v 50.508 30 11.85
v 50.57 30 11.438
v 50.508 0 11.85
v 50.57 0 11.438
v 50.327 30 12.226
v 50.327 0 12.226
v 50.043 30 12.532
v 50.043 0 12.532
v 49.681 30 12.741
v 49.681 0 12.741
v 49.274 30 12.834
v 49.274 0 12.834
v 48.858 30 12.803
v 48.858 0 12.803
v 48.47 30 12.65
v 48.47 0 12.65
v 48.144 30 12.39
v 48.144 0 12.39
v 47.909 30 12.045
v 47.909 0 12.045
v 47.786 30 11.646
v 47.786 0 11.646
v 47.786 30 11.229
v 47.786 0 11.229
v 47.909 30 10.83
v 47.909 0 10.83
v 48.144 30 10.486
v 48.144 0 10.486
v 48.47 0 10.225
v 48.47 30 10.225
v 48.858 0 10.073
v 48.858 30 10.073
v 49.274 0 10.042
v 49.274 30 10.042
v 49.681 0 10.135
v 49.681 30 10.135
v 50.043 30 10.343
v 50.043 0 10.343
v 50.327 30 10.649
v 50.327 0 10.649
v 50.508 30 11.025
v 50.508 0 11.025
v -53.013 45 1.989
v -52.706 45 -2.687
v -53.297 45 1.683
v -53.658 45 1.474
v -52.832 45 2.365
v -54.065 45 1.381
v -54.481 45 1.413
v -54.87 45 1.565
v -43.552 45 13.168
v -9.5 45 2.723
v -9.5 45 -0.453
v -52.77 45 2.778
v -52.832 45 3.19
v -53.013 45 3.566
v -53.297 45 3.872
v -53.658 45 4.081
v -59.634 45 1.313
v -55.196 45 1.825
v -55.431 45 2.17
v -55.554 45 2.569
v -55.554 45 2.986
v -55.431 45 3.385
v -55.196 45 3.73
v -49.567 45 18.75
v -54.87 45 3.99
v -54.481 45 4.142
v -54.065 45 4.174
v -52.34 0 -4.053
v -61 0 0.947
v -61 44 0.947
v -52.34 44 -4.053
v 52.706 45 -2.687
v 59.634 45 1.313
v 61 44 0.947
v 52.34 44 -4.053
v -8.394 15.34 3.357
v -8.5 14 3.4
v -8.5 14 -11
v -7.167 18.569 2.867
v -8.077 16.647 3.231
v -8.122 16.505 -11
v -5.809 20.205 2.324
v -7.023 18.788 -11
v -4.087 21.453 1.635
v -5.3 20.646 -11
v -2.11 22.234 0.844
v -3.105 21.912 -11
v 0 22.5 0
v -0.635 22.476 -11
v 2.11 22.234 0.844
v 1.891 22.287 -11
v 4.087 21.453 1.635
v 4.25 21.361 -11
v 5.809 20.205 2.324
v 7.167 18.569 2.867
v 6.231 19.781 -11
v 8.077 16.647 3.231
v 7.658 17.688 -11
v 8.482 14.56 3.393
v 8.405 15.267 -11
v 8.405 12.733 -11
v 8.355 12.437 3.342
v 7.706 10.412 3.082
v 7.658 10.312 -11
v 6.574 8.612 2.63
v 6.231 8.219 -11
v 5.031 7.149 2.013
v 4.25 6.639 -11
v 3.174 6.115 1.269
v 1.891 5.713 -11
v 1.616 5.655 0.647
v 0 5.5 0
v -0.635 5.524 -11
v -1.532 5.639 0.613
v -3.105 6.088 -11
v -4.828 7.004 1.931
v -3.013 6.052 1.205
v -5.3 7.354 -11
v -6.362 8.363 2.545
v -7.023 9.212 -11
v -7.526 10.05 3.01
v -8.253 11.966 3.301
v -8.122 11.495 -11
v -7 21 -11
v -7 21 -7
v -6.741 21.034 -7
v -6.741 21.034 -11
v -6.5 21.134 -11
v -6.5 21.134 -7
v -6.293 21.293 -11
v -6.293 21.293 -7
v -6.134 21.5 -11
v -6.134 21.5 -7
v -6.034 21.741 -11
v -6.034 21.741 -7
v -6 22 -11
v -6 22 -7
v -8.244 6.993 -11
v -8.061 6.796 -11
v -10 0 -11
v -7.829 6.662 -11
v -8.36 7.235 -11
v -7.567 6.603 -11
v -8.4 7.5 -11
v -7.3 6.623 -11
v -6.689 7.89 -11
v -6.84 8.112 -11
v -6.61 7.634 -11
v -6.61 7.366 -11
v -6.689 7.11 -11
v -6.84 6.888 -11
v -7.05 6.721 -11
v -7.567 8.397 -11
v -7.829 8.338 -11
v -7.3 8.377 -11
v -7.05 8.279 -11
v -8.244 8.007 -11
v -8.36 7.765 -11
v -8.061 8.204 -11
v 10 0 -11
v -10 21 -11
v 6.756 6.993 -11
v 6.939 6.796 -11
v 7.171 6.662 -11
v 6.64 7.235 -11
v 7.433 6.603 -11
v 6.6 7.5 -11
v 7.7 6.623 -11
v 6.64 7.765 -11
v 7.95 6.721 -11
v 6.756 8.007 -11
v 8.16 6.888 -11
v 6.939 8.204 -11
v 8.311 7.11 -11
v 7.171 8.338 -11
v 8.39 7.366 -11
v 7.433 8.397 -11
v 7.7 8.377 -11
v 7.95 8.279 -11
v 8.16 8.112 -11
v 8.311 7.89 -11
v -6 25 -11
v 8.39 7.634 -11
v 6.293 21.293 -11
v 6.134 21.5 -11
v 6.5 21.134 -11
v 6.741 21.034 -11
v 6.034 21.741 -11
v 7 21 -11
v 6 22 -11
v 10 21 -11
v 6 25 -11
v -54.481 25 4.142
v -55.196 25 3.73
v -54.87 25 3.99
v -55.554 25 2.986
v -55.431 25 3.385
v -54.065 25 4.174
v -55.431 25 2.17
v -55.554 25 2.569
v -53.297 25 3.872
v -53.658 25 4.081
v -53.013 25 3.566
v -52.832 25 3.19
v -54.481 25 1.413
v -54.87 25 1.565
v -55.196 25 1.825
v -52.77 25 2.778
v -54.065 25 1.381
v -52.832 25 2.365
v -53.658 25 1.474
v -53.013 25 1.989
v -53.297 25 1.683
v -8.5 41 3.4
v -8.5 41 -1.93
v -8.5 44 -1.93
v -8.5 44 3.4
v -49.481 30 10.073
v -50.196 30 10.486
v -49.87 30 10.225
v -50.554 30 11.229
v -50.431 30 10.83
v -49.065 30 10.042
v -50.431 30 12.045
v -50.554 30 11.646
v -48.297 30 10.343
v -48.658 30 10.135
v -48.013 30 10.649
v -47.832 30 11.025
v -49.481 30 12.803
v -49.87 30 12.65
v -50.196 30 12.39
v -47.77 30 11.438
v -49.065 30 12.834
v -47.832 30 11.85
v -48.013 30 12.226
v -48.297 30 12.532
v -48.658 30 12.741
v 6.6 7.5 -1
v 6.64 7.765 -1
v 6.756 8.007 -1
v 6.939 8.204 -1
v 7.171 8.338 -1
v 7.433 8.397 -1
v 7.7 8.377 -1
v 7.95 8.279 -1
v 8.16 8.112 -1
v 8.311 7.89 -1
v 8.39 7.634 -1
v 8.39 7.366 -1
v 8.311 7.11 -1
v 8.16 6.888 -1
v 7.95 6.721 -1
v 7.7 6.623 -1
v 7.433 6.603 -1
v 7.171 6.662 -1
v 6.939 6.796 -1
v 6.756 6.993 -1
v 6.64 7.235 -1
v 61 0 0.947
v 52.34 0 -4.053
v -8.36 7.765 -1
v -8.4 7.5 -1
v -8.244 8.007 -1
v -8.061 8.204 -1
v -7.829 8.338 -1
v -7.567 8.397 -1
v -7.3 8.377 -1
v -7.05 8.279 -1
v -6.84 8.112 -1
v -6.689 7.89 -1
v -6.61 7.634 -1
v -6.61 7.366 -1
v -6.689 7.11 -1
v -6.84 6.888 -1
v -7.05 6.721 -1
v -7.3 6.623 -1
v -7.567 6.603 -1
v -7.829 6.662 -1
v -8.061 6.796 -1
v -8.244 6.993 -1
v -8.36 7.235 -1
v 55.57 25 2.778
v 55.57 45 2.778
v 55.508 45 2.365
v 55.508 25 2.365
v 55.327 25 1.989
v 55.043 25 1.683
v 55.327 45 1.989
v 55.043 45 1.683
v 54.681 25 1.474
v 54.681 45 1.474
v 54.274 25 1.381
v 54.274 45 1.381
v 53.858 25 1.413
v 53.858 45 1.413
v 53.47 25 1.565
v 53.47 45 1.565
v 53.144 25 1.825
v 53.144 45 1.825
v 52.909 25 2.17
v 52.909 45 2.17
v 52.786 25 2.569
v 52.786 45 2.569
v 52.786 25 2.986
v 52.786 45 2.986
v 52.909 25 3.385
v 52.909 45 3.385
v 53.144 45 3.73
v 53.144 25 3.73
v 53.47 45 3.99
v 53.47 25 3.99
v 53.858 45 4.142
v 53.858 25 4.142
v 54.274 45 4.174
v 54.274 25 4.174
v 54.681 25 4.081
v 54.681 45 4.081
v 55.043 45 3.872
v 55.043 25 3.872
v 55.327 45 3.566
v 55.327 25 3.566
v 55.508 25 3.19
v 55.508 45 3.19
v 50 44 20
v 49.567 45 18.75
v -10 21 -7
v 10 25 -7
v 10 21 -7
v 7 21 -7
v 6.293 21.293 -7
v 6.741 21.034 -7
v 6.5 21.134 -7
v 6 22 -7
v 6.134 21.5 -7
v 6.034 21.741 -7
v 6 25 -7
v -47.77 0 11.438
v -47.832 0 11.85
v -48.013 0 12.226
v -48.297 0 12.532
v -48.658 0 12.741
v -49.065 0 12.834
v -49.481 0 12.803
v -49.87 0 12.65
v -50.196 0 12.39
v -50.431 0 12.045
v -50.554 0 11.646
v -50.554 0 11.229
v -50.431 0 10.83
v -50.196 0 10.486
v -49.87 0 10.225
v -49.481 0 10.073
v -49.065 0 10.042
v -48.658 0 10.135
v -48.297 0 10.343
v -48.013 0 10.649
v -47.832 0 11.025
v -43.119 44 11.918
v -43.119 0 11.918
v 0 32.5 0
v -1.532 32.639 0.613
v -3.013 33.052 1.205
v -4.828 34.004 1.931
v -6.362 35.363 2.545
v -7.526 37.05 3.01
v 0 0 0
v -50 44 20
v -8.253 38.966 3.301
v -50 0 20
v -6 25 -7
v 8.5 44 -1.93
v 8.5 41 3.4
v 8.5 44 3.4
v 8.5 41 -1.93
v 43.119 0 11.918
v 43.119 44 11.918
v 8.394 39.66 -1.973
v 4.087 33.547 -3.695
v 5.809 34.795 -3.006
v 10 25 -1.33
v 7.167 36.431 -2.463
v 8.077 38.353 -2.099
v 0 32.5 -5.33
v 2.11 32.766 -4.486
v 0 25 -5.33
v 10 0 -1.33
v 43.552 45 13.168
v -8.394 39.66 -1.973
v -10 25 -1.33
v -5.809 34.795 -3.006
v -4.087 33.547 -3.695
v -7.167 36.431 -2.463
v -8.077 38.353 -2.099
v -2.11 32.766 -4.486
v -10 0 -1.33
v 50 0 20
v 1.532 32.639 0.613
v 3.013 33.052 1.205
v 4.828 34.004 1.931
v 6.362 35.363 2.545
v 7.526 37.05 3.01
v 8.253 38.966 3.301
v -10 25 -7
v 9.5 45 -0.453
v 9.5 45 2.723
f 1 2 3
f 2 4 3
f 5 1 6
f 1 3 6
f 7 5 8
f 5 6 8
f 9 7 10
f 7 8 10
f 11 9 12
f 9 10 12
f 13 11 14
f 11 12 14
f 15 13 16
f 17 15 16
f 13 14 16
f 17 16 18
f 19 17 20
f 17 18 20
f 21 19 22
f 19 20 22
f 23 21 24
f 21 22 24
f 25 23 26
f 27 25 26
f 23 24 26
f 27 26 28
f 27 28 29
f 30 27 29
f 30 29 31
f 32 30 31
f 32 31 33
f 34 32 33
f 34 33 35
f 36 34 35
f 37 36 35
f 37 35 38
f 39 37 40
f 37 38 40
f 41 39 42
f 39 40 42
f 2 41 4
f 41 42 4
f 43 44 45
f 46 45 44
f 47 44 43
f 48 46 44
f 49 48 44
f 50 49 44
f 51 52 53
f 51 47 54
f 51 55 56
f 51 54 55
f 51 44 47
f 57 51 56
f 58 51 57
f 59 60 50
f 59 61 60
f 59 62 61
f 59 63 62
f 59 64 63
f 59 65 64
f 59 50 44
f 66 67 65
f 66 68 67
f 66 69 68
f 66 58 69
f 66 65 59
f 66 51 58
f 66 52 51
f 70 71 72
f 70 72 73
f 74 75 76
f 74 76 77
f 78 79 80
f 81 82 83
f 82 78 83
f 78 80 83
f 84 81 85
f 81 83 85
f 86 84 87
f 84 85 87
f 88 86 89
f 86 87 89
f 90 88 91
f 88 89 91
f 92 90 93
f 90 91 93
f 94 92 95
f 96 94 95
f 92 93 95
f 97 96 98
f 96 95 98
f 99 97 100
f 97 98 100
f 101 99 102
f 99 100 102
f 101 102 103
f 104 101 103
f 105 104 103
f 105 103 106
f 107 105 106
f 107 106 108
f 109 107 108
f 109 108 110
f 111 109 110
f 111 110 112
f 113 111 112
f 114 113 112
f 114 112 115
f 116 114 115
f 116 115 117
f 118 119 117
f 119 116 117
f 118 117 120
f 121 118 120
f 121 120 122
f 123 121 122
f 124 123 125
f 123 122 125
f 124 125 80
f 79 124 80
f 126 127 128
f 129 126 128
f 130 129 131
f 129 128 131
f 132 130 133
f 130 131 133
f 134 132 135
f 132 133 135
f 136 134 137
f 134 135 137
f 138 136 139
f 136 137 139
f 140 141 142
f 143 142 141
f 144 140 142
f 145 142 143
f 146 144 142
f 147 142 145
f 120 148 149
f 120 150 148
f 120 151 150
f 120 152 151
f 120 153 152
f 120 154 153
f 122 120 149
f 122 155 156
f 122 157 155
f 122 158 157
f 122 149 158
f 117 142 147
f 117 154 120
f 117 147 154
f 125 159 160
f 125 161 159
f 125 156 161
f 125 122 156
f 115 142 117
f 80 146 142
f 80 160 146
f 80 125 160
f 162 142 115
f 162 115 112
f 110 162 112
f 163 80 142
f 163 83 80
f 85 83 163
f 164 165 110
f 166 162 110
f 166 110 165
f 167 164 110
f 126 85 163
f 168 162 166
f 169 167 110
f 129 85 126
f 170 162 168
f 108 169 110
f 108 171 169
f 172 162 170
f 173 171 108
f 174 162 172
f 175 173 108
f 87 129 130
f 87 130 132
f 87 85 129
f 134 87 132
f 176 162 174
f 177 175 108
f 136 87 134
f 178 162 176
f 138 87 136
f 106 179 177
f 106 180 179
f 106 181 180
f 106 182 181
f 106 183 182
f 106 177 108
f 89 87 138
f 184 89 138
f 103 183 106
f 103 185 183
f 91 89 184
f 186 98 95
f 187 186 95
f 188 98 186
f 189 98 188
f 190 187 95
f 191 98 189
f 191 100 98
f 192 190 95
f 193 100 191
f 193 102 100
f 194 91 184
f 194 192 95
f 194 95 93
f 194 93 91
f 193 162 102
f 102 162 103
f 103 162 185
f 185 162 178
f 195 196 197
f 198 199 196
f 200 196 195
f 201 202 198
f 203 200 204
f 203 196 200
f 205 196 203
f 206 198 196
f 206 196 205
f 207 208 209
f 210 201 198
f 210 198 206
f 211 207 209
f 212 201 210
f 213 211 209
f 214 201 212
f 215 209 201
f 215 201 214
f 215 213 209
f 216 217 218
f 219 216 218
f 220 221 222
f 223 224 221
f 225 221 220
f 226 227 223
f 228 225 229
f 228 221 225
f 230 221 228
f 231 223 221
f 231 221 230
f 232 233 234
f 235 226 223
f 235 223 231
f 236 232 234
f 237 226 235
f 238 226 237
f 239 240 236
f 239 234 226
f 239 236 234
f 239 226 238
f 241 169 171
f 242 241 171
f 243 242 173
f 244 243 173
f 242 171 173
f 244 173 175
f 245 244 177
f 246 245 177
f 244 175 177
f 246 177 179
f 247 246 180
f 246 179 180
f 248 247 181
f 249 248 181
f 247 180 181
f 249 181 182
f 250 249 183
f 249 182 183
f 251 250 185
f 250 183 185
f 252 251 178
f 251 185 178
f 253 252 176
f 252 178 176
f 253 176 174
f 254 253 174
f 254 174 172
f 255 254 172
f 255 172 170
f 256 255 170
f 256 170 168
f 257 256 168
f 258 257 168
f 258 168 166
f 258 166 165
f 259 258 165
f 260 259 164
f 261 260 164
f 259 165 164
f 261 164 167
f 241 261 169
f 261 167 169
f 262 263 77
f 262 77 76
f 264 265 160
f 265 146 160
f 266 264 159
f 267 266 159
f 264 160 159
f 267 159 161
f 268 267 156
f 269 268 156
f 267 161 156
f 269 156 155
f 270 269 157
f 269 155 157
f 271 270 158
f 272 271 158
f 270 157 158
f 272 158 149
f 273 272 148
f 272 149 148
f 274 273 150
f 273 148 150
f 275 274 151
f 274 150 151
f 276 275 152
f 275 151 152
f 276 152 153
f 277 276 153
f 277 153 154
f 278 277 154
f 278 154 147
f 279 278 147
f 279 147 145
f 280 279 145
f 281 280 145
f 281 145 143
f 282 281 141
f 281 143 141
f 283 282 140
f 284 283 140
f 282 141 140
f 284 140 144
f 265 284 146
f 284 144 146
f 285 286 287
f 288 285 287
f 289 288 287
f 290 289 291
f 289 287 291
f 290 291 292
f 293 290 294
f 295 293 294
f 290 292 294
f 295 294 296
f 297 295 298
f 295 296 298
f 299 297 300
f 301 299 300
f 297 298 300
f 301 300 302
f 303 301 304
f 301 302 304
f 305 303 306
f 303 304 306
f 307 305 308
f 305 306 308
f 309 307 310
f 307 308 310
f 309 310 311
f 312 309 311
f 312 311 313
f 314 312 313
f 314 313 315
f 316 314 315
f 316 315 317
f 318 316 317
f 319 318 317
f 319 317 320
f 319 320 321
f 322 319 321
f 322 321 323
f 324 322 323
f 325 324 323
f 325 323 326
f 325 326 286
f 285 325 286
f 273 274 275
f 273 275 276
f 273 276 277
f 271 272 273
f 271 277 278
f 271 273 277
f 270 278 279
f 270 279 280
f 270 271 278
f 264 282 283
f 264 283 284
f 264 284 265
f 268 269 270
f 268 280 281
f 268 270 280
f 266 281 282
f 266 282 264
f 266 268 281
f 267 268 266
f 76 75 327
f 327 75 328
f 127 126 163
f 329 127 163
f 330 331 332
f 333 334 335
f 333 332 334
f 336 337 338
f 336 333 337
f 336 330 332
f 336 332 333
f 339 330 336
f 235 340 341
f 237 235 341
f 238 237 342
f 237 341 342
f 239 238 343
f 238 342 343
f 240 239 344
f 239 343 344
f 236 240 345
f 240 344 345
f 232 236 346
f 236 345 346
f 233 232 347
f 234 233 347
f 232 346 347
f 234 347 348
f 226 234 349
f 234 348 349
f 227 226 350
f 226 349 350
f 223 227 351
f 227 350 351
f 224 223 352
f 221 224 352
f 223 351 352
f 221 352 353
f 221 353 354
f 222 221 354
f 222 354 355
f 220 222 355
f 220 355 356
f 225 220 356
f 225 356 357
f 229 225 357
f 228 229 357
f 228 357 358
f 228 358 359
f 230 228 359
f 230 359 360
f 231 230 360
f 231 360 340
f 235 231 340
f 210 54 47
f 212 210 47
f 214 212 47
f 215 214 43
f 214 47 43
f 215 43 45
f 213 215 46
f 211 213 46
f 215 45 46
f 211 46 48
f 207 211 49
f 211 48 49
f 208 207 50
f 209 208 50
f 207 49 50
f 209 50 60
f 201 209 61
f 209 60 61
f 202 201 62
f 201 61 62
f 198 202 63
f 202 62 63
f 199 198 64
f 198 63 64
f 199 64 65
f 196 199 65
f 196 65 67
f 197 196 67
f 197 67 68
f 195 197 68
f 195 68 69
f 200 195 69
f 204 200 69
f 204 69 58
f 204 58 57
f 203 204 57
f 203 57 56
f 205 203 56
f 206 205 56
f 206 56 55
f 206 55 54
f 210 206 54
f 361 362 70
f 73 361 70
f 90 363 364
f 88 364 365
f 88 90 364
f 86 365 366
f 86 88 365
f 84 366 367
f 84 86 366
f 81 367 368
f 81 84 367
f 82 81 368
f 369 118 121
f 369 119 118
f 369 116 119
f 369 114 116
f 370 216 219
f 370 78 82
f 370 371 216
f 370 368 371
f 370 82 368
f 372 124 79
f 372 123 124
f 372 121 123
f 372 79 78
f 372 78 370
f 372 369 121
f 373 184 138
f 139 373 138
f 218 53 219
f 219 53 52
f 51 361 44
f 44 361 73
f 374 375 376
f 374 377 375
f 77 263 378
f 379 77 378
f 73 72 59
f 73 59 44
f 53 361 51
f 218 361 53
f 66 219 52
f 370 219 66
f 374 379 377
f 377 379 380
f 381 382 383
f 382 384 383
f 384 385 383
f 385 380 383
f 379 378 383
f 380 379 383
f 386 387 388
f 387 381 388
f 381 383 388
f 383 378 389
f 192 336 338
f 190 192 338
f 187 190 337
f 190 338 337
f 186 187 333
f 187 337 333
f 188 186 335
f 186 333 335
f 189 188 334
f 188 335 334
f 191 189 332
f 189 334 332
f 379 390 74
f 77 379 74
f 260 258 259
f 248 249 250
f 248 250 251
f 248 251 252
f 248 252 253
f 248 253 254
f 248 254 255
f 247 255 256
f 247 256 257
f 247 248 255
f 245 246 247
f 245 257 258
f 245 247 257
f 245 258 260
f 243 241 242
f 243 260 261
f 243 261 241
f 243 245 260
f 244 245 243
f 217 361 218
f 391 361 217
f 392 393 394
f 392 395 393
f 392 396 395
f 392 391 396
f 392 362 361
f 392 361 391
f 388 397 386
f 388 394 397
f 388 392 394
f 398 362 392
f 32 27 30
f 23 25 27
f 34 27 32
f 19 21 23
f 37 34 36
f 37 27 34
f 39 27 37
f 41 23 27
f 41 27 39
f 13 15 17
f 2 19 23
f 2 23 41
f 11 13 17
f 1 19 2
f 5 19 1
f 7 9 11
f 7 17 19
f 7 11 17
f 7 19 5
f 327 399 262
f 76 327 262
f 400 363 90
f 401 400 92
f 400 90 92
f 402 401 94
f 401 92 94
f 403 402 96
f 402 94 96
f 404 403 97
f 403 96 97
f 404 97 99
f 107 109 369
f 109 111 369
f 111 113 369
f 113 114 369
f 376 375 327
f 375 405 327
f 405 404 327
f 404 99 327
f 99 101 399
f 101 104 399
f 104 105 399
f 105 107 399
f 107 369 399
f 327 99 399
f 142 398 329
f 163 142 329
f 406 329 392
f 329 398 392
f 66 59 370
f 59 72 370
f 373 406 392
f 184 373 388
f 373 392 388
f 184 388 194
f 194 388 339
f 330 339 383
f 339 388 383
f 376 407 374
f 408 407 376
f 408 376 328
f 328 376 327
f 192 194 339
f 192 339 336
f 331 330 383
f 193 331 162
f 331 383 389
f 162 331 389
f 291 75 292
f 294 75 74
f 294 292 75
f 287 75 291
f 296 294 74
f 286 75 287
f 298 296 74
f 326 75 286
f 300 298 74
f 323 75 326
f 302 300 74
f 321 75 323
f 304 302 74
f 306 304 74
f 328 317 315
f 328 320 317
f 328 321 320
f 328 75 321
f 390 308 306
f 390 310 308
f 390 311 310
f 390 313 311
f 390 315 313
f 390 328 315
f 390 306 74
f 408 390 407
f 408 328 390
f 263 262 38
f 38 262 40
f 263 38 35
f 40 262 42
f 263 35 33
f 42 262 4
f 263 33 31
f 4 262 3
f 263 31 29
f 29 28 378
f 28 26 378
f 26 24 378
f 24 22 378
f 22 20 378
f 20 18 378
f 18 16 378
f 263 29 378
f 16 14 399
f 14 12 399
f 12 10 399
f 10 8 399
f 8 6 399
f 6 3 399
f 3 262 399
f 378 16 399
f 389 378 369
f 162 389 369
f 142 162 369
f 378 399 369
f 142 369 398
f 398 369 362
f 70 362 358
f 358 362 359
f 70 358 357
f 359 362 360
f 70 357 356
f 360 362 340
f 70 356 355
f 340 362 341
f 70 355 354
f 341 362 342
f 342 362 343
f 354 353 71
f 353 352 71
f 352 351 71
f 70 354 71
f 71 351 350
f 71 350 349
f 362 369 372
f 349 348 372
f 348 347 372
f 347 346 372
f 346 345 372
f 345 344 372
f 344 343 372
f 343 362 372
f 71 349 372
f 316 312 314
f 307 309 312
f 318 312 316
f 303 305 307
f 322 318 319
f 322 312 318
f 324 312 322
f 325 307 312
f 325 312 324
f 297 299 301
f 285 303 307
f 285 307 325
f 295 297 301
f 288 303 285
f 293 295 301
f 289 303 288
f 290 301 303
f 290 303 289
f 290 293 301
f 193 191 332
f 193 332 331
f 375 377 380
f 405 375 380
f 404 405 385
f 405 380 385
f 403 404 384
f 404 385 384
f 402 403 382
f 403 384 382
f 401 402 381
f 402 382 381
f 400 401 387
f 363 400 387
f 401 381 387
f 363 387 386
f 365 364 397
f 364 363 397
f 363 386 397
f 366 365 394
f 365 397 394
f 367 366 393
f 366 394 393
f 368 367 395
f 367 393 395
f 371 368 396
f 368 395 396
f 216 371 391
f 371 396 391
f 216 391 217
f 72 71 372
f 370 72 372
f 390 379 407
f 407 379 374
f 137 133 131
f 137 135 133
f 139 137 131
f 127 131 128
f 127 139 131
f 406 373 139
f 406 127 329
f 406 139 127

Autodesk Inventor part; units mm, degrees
ref_plane "XZ Plane" through (0, 0, 0) normal (0, 1, 0) x (-1, 0, 0)
ref_plane "XY Plane" through (0, 0, 0) normal (0, 0, 1) x (1, 0, 0)
sketch "Sketch1" plane through (0, 0, 0) normal (0, 1, 0) x (-1, 0, 0)
  line L0 (-56.669873, -1.552559) -> (-61, 0.947441)
  line L1 (56.669873, -1.552559) -> (61, 0.947441)
  line L2 (61, 0.947441) -> (50, 20)
  line L3 (-50, 20) -> (-61, 0.947441)
  line L4 (0, 0) -> (-50, 20)
  line L5 (0, 0) -> (50, 20)
  line L6 (-50, 20) -> (-55, 11.339746)
  line L7 (50, 20) -> (55, 11.339746)
  line L8 (-56.669873, -1.552559) -> (-52.339746, -4.052559)
  line L9 (56.669873, -1.552559) -> (52.339746, -4.052559)
  line L10 (50, 20) -> (52.5, 15.669873)
  line L11 (-50, 20) -> (-52.5, 15.669873)
  line L12 (-43.119361, 11.917617) -> (0, -5.330127)
  line L13 (43.119361, 11.917617) -> (0, -5.330127)
  line L14 (-52.339746, -4.052559) -> (-43.119361, 11.917617)
  line L15 (43.119361, 11.917617) -> (52.339746, -4.052559)
  dimension "d1" = 5
  dimension "d2" = 5
  dimension "d3" = 5
  dimension "d4" = 5
extrude "Extrusion1" add sketch "Sketch1" along normal blind 45
sketch "Sketch2" plane through (0, 0, 0) normal (0, -1, 0) x (1, 0, 0)
  line L0 (61, 0.947441) -> (52.339746, -4.052559)
  line L1 (50, 20) -> (61, 0.947441)
  line L2 (0, 0) -> (50, 20)
  line L3 (-50, 20) -> (0, 0)
  line L4 (-61, 0.947441) -> (-50, 20)
  line L5 (-52.339746, -4.052559) -> (-61, 0.947441)
  line L6 (-43.119361, 11.917617) -> (-52.339746, -4.052559)
  line L7 (0, -5.330127) -> (-43.119361, 11.917617)
  line L8 (43.119361, 11.917617) -> (0, -5.330127)
  line L9 (52.339746, -4.052559) -> (43.119361, 11.917617)
  line L10 (-56.669873, -1.552559) -> (-49.169873, 11.437822)
  line L11 (56.669873, -1.552559) -> (49.169873, 11.437822)
  circle A0 centre (49.169873, 11.437822) radius 1.4
  circle A1 centre (-49.169873, 11.437822) radius 1.4
  dimension "d8" = 15
  dimension "d9" = 15
  dimension "d10" = 2.8
  dimension "d11" = 2.8
extrude "Extrusion2" cut sketch "Sketch2" against normal blind 30 contours A0 | A1
sketch "Sketch3" plane through (0, 45, 0) normal (0, 1, 0) x (1, 0, 0)
  circle A0 centre (-54.169873, -2.777568) radius 1.4
  circle A1 centre (54.169873, -2.777568) radius 1.4
  line L0 (61, -0.947441) -> (52.339746, 4.052559)
  line L1 (52.339746, 4.052559) -> (43.119361, -11.917617)
  line L2 (43.119361, -11.917617) -> (0, 5.330127)
  line L3 (0, 5.330127) -> (-43.119361, -11.917617)
  line L4 (-43.119361, -11.917617) -> (-52.339746, 4.052559)
  line L5 (-52.339746, 4.052559) -> (-61, -0.947441)
  line L6 (-61, -0.947441) -> (-50, -20)
  line L7 (-50, -20) -> (0, 0)
  line L8 (0, 0) -> (50, -20)
  line L9 (50, -20) -> (61, -0.947441)
  dimension "d30" = 2.8
  dimension "d31" = 2.8
extrude "Extrusion3" cut sketch "Sketch3" against normal blind 20 contours A0 | A1
chamfer "Chamfer1" distance 1 angle 45 2 edges at (-56.6699, 45, -1.5526) (56.6699, 45, -1.5526)
chamfer "Chamfer2" distance 1 angle 45 8 edges at (55.25, 45, 10.9067) (47.4796, 45, 4.3655) (21.5597, 45, 3.2937) (-21.5597, 45, 3.2937) (-47.4796, 45, 4.3655) (-55.25, 45, 10.9067) (-25, 45, 10) (25, 45, 10)
ref_plane "Work Plane1" through (0, 0, 0) normal (0, 0, -1) x (0, 1, 0)
sketch "Sketch4" plane through (0, 0, 0) normal (0, 0, -1) x (0, 1, 0)
  line L0 (0, 0) -> (0, -10)
  line L1 (0, 0) -> (0, -43.119361)
  line L2 (0, -10) -> (25, -10)
  line L3 (25, -10) -> (25, 10)
  line L4 (25, 10) -> (0, 10)
  line L5 (0, 10) -> (0, 0)
  dimension "d33" = 10
  dimension "d34" = 25
  dimension "d35" = 20
extrude "Extrusion4" add sketch "Sketch4" along normal blind 11
sketch "Sketch5" plane through (0, 0, -11) normal (0, 0, -1) x (-1, 0, 0)
  circle A0 centre (0, 14) radius 8.5
  circle A1 centre (-7.5, 7.5) radius 0.9
  circle A2 centre (7.5, 7.5) radius 0.9
  line L0 (0, 14) -> (0, 41)
  line L1 (0, 0) -> (0, 44)
  line L2 (-8.5, 41) -> (-8.5, 45)
  line L3 (0, 45) -> (-43.552262, 45)
  line L4 (8.5, 41) -> (8.5, 45)
  line L5 (0, 45) -> (49.567099, 45)
  line L6 (8.5, 45) -> (-8.5, 45)
  arc A3 (-8.5, 41) -> (8.5, 41) centre (0, 41) ccw
  dimension "d38" = 17
  dimension "d39" = 1.8
  dimension "d40" = 1.8
  dimension "d41" = 27
extrude "Extrusion5" cut sketch "Sketch5" against normal through all contours A0 L1 L0 | L0 L1 A0 | L2 L3 L5 L4 A3
chamfer "Chamfer3" distance 1 angle 45 2 edges at (8.5, 45, 0.7349) (-8.5, 45, 0.7349)
sketch "Sketch6" plane through (0, 0, -11) normal (0, 0, -1) x (-1, 0, 0)
  circle A0 centre (-7.5, 7.5) radius 0.9
  circle A1 centre (7.5, 7.5) radius 0.9
  point P0 (0, 0)
  point P1 (0, 0)
  dimension "d49" = 1.8
  dimension "d50" = 1.8
extrude "Extrusion6" cut sketch "Sketch6" against normal blind 10
sketch "Sketch7" plane through (0, 0, -11) normal (0, 0, -1) x (-1, 0, 0)
  line L0 (-10, 25) -> (10, 25)
  line L1 (-10, 25) -> (-6, 25)
  line L2 (-6, 25) -> (-6, 21)
  line L3 (-6, 21) -> (-10, 21)
  line L4 (10, 25) -> (6, 25)
  line L5 (-10, 25) -> (10, 25)
  line L6 (6, 25) -> (6, 21)
  line L7 (6, 21) -> (10, 21)
  line L8 (10, 25) -> (10, 21)
  line L9 (-10, 25) -> (-6, 25)
  line L10 (-6, 25) -> (-6, 21)
  line L11 (-6, 21) -> (-10, 21)
  line L12 (-10, 21) -> (-10, 25)
  line L13 (6, 25) -> (10, 25)
  line L14 (10, 25) -> (10, 21)
  line L15 (10, 21) -> (6, 21)
  line L16 (6, 21) -> (6, 25)
  dimension "d54" = 4
  dimension "d55" = 4
  dimension "d56" = 4
extrude "Extrusion7" cut sketch "Sketch7" against normal blind 4
fillet "Fillet1" radius 1 2 edges at (6, 21, -9) (-6, 21, -9)
properties part number "Front Support" material "ABS Plastic"
